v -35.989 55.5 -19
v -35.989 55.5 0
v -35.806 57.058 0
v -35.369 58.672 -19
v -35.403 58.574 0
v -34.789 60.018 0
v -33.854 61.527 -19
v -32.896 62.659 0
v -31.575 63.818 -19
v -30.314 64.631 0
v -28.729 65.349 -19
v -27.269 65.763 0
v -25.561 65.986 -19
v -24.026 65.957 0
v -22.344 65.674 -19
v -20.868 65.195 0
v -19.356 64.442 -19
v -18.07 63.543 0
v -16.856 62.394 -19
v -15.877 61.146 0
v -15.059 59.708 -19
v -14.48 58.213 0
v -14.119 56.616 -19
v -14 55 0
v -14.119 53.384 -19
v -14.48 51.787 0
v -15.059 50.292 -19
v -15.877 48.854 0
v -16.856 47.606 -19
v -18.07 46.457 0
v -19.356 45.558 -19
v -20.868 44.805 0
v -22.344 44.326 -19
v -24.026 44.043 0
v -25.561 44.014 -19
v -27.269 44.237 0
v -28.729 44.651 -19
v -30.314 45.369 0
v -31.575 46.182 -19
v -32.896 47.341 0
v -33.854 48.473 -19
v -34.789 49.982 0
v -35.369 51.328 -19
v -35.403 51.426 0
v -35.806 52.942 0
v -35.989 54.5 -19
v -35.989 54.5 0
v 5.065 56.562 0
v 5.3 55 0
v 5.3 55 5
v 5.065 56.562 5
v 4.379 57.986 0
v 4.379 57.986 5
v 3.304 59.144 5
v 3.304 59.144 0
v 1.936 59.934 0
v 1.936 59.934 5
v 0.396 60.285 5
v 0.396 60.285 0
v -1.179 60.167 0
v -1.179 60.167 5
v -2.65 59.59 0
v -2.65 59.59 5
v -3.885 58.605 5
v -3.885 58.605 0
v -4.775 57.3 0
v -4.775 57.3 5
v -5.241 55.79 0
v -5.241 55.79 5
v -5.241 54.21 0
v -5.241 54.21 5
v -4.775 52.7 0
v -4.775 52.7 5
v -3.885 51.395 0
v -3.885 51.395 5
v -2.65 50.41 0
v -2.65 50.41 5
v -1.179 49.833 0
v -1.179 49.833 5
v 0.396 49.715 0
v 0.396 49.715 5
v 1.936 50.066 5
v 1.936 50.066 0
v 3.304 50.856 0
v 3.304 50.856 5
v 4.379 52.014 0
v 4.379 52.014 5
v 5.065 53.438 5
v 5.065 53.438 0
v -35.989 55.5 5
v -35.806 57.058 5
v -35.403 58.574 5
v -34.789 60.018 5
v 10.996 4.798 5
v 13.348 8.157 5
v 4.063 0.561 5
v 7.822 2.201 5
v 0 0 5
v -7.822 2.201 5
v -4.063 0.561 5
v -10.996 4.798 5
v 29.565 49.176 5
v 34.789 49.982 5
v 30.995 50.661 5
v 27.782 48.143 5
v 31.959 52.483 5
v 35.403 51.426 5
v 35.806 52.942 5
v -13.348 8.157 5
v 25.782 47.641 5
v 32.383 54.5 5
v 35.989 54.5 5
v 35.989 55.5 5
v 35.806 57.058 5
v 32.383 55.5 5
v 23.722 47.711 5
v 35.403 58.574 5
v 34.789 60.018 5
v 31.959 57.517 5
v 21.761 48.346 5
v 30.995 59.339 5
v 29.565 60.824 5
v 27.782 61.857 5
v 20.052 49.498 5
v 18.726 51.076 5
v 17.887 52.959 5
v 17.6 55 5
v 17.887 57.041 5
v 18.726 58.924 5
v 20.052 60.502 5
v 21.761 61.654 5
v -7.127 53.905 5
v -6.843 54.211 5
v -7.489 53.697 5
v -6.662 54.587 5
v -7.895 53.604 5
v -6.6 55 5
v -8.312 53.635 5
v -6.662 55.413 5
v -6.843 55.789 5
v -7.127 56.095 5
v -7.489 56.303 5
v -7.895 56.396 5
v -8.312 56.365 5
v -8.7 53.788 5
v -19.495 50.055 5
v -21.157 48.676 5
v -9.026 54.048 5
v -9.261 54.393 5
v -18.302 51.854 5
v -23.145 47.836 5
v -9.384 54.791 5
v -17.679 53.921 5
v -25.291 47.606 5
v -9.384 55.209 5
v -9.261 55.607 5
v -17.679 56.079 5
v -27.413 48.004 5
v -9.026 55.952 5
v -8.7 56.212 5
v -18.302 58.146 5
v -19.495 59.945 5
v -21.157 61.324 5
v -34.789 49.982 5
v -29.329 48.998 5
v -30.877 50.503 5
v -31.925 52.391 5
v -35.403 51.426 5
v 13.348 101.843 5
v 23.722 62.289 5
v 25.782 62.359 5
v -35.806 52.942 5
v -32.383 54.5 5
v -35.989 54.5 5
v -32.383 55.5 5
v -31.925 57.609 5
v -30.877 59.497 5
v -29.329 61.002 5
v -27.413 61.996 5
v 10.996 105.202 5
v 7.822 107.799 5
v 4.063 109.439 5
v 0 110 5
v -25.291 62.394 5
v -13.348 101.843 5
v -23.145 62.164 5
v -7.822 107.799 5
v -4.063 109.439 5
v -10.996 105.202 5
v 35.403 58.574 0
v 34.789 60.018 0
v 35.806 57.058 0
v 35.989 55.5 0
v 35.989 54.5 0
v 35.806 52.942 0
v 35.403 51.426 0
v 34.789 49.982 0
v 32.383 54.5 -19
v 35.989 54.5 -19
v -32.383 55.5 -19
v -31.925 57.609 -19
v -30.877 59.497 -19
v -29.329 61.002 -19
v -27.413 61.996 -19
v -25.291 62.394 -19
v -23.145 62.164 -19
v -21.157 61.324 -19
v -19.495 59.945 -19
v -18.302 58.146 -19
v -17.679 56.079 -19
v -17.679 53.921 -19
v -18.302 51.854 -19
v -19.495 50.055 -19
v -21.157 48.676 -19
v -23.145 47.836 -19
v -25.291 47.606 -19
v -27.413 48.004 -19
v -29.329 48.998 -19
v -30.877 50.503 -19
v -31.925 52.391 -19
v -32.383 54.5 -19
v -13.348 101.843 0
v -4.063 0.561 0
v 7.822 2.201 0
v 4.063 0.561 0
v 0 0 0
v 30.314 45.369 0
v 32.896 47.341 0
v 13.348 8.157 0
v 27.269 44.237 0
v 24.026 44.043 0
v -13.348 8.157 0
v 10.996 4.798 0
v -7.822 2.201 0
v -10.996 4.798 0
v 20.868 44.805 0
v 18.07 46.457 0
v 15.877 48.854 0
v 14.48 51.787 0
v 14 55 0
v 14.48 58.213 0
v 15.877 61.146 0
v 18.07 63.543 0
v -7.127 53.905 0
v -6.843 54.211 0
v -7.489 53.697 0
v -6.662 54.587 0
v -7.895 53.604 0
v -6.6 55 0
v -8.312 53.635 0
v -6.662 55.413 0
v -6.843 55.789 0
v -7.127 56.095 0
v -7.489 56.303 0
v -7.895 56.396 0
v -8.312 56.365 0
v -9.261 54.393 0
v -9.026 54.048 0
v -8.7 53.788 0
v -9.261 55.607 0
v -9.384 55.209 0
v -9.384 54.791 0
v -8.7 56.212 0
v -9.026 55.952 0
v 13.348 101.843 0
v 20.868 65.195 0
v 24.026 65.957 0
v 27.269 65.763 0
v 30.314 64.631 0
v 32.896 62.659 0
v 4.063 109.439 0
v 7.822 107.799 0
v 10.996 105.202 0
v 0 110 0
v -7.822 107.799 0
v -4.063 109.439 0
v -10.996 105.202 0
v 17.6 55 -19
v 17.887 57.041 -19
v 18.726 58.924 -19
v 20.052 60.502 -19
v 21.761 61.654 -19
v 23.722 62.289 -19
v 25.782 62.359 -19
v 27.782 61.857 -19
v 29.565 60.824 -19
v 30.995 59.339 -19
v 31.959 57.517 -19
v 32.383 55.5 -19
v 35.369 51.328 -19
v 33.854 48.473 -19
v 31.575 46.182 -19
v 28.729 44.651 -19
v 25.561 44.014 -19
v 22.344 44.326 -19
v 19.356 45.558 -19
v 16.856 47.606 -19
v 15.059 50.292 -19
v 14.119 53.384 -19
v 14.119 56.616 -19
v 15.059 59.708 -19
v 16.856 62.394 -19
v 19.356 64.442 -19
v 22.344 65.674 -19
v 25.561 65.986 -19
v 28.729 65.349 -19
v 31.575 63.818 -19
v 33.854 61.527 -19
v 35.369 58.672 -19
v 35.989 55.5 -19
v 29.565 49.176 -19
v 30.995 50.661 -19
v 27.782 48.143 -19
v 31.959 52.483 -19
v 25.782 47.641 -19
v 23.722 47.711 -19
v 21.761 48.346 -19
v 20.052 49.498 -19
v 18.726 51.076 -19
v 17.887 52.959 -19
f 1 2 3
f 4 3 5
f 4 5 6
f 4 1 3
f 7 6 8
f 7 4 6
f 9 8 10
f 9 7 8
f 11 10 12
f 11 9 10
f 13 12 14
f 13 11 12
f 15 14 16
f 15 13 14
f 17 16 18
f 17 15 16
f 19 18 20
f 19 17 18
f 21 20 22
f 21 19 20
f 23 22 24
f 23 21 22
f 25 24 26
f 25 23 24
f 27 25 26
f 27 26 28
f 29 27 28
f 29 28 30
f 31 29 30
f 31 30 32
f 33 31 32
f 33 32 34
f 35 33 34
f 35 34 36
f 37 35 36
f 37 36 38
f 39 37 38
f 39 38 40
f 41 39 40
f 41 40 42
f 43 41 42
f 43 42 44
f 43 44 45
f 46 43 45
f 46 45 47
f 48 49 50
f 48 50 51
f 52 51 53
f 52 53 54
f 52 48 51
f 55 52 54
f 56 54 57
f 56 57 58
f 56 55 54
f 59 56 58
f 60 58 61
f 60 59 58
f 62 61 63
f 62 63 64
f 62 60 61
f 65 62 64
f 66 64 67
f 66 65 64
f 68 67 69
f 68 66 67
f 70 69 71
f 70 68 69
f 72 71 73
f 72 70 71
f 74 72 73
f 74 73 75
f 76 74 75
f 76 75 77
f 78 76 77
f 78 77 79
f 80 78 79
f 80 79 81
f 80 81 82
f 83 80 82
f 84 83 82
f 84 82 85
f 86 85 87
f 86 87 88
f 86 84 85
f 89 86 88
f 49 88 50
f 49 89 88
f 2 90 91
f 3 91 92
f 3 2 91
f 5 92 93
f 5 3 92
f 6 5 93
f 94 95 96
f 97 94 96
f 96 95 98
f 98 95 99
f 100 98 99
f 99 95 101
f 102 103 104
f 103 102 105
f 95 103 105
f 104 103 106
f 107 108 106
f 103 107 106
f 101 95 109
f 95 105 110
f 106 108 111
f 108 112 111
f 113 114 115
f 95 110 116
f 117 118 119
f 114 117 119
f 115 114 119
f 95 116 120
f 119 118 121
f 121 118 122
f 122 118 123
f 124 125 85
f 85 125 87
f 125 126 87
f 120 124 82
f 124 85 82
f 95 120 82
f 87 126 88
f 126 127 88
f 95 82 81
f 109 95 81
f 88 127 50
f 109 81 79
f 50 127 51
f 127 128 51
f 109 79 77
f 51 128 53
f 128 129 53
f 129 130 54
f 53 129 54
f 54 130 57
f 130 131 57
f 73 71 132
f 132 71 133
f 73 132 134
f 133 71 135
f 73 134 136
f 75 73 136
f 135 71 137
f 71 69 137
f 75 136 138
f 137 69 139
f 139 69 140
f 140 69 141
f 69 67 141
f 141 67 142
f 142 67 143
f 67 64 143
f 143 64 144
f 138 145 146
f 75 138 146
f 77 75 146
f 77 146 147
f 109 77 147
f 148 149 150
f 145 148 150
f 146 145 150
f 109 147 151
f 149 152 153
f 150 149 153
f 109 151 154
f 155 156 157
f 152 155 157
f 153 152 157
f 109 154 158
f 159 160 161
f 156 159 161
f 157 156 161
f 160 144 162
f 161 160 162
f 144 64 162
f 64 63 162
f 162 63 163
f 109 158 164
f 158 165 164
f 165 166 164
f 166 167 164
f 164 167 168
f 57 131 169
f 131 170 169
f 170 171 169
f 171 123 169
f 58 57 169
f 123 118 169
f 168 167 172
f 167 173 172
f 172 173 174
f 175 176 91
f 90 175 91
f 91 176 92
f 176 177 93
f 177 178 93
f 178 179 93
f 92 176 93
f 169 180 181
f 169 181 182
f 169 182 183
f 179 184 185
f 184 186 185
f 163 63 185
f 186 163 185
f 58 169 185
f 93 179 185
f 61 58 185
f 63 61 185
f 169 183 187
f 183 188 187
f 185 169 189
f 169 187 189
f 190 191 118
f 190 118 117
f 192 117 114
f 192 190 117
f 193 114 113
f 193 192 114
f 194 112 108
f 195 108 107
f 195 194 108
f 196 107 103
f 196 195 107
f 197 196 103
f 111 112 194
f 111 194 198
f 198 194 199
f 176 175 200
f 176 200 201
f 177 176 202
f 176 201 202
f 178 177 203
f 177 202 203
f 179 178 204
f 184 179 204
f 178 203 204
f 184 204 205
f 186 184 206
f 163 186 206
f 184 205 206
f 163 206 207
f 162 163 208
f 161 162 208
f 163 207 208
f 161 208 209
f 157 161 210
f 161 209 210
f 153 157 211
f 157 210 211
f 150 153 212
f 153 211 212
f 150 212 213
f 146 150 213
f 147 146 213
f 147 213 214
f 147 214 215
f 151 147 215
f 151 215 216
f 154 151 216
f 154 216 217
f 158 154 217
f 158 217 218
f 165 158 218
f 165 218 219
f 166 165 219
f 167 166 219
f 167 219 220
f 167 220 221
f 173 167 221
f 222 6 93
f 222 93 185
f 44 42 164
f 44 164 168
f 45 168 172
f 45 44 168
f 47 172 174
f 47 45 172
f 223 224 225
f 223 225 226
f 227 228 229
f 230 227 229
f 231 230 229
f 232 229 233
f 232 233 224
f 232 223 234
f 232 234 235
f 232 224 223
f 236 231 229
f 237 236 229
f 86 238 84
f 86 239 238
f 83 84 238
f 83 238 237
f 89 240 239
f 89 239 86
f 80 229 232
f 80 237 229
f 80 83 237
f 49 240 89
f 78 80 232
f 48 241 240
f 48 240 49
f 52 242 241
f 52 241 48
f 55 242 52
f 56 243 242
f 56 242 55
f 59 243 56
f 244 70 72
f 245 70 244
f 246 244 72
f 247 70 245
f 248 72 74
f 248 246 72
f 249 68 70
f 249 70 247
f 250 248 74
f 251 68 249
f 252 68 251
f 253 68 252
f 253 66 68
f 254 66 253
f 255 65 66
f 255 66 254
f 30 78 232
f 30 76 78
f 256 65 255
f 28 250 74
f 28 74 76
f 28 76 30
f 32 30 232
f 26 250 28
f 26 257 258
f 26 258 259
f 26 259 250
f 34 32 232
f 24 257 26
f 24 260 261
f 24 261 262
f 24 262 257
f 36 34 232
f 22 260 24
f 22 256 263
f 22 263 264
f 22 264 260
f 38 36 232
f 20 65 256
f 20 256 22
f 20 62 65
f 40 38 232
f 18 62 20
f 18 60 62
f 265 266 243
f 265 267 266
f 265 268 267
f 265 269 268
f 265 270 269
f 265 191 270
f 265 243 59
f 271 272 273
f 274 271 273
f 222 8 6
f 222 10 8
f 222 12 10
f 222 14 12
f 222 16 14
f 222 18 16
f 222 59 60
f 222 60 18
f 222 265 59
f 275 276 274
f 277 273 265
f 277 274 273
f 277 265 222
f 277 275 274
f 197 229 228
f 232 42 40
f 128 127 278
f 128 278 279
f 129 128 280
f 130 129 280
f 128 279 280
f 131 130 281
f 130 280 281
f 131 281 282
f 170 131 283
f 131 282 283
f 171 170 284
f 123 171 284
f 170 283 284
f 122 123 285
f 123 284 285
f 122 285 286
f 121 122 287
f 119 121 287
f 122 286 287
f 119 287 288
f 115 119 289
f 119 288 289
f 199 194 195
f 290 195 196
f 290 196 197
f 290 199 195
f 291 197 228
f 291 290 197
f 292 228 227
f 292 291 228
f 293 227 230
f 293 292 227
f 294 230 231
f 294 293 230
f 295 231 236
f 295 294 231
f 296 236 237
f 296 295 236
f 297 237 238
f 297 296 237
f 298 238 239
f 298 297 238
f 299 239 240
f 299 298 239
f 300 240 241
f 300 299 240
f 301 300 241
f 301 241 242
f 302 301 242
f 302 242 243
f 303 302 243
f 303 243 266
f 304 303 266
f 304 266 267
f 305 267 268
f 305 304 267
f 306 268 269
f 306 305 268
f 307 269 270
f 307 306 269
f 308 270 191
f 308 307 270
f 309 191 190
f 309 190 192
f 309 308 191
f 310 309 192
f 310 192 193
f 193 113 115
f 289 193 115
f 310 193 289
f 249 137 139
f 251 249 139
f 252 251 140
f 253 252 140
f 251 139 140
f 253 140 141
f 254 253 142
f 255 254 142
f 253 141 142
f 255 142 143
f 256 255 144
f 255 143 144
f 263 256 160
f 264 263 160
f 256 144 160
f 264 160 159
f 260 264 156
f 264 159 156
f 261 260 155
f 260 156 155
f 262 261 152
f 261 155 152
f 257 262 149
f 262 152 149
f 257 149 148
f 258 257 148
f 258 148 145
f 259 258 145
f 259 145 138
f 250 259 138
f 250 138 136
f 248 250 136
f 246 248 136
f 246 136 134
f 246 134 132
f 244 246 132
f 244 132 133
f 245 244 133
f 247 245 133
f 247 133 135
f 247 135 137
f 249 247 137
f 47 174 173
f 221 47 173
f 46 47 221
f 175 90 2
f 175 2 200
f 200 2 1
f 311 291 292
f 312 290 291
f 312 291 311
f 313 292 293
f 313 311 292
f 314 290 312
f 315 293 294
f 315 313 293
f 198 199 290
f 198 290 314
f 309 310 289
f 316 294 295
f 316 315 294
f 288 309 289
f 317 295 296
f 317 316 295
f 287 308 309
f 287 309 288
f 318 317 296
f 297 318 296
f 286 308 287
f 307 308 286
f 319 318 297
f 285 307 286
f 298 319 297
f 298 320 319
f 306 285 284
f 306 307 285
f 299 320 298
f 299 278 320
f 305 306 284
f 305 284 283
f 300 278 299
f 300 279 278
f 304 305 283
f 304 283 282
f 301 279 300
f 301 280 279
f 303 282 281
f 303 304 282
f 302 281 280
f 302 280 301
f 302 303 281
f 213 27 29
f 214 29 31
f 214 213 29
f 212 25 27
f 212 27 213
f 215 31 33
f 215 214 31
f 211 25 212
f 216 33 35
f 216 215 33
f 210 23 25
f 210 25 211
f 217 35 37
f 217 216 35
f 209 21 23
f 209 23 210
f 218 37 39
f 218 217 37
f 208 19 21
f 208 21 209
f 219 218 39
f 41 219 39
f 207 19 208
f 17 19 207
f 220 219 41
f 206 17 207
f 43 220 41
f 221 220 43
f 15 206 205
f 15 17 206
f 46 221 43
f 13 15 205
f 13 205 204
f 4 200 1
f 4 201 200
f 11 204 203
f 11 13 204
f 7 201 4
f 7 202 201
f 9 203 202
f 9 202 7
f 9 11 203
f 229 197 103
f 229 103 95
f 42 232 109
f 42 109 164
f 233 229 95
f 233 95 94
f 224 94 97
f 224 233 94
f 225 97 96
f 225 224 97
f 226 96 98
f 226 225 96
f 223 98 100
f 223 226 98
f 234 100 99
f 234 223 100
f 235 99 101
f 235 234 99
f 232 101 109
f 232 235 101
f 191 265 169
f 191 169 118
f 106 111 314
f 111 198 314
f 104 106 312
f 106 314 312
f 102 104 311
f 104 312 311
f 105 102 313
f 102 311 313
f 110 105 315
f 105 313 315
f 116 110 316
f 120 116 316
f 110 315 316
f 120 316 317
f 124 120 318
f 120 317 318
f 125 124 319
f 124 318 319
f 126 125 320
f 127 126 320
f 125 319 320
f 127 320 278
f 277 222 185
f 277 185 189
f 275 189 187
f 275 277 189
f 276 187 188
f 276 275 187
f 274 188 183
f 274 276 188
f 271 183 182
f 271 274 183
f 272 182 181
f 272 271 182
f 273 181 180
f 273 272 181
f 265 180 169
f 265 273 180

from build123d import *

# Parameters (mm, degrees)
SKETCH1_R               = 5.3
BOSS_EXTRUDE1_DEPTH     = 5
BOSS_EXTRUDE2_START     = 19
SKETCH2_R               = 11
BOSS_EXTRUDE2_DEPTH     = 19
CUT_EXTRUDE1_REACH      = 120.203
SKETCH3_R               = 7.4
CUT_EXTRUDE2_REACH      = 134.834
CUT_EXTRUDE2_END_RADIUS = 7.4
SKETCH6_W               = 24
SKETCH6_H               = 1
CUT_EXTRUDE3_REACH      = 120.2
SKETCH4_R               = 1.4


with BuildPart() as part:
    # Sketch1 → Boss-Extrude1 (new body)
    with BuildSketch(Plane.XY):
        with BuildLine():
            Line((-34.788764, 60.017978), (-13.348315, 101.842697))
            ThreePointArc((-13.348315, 101.842697), (0, 110), (13.348315, 101.842697))
            Line((13.348315, 101.842697), (34.788764, 60.017978))
            ThreePointArc((34.788764, 60.017978), (36, 55), (34.788764, 49.982022))
            Line((34.788764, 49.982022), (13.348315, 8.157303))
            ThreePointArc((13.348315, 8.157303), (0, 0), (-13.348315, 8.157303))
            Line((-13.348315, 8.157303), (-34.788764, 49.982022))
            ThreePointArc((-34.788764, 49.982022), (-36, 55), (-34.788764, 60.017978))
        make_face()
        with Locations((0, 55)):
            Circle(SKETCH1_R, mode=Mode.SUBTRACT)
    extrude(amount=BOSS_EXTRUDE1_DEPTH)

    # Sketch2 → Boss-Extrude2 (add)
    with BuildSketch(Plane(origin=(0, 0, 0), x_dir=(-1, 0, 0), z_dir=(0, 0, -1)).offset(BOSS_EXTRUDE2_START)):
        with Locations((-25, 55)):
            Circle(SKETCH2_R)
        with Locations((25, 55)):
            Circle(SKETCH2_R)
    extrude(amount=-BOSS_EXTRUDE2_DEPTH)

    # Sketch3 → Cut-Extrude1 (cut, up to next)
    with BuildSketch(Plane(origin=(0, 0, -19), x_dir=(-1, 0, 0), z_dir=(0, 0, -1)), mode=Mode.PRIVATE) as cut_extrude1_sk1:
        with Locations((-25, 55)):
            Circle(SKETCH3_R)
    cut_extrude1_tool1 = extrude(cut_extrude1_sk1.sketch, amount=-CUT_EXTRUDE1_REACH, mode=Mode.PRIVATE) & part.part
    # Sketch3 → Cut-Extrude1 (cut, up to next)
    with BuildSketch(Plane(origin=(0, 0, -19), x_dir=(-1, 0, 0), z_dir=(0, 0, -1)), mode=Mode.PRIVATE) as cut_extrude1_sk2:
        with Locations((25, 55)):
            Circle(SKETCH3_R)
    cut_extrude1_tool2 = extrude(cut_extrude1_sk2.sketch, amount=-CUT_EXTRUDE1_REACH, mode=Mode.PRIVATE) & part.part
    add(cut_extrude1_tool1.solids().sort_by_distance((25, 55, -19))[0], mode=Mode.SUBTRACT)
    add(cut_extrude1_tool2.solids().sort_by_distance((-25, 55, -19))[0], mode=Mode.SUBTRACT)

    # Cut-Extrude2: up to this cylinder (the profile starts outside it)
    cut_extrude2_end = Plane(origin=(25, 55, -7), z_dir=(0, 0, -1)) * Cylinder(CUT_EXTRUDE2_END_RADIUS, 285.468, mode=Mode.PRIVATE)
    # Sketch6 → Cut-Extrude2 (cut, up to the surface)
    with BuildSketch(Plane(origin=(36, 0, 0), x_dir=(0, 0, -1), z_dir=(1, 0, 0)), mode=Mode.PRIVATE) as cut_extrude2_sk1:
        with Locations((7, 55)):
            Rectangle(SKETCH6_W, SKETCH6_H)
    cut_extrude2_tool1 = extrude(cut_extrude2_sk1.sketch, amount=-CUT_EXTRUDE2_REACH, mode=Mode.PRIVATE) - cut_extrude2_end
    cut_extrude2 = cut_extrude2_tool1.solids().sort_by_distance((36, 55, -7))[0]
    add(cut_extrude2, mode=Mode.SUBTRACT)

    # Mirror1: Cut-Extrude2 across plane
    add(cut_extrude2.mirror(Plane(origin=(0, 0, 0), x_dir=(0, 0, 1), z_dir=(1, 0, 0))), mode=Mode.SUBTRACT)

    # Sketch4 → Cut-Extrude3 (cut, up to next)
    with BuildSketch(Plane.XY.offset(5), mode=Mode.PRIVATE) as cut_extrude3_sk1:
        with Locations((-8, 55)):
            Circle(SKETCH4_R)
    cut_extrude3_tool1 = extrude(cut_extrude3_sk1.sketch, amount=-CUT_EXTRUDE3_REACH, mode=Mode.PRIVATE) & part.part
    add(cut_extrude3_tool1.solids().sort_by_distance((-8, 55, 5))[0], mode=Mode.SUBTRACT)


solid = part.part
